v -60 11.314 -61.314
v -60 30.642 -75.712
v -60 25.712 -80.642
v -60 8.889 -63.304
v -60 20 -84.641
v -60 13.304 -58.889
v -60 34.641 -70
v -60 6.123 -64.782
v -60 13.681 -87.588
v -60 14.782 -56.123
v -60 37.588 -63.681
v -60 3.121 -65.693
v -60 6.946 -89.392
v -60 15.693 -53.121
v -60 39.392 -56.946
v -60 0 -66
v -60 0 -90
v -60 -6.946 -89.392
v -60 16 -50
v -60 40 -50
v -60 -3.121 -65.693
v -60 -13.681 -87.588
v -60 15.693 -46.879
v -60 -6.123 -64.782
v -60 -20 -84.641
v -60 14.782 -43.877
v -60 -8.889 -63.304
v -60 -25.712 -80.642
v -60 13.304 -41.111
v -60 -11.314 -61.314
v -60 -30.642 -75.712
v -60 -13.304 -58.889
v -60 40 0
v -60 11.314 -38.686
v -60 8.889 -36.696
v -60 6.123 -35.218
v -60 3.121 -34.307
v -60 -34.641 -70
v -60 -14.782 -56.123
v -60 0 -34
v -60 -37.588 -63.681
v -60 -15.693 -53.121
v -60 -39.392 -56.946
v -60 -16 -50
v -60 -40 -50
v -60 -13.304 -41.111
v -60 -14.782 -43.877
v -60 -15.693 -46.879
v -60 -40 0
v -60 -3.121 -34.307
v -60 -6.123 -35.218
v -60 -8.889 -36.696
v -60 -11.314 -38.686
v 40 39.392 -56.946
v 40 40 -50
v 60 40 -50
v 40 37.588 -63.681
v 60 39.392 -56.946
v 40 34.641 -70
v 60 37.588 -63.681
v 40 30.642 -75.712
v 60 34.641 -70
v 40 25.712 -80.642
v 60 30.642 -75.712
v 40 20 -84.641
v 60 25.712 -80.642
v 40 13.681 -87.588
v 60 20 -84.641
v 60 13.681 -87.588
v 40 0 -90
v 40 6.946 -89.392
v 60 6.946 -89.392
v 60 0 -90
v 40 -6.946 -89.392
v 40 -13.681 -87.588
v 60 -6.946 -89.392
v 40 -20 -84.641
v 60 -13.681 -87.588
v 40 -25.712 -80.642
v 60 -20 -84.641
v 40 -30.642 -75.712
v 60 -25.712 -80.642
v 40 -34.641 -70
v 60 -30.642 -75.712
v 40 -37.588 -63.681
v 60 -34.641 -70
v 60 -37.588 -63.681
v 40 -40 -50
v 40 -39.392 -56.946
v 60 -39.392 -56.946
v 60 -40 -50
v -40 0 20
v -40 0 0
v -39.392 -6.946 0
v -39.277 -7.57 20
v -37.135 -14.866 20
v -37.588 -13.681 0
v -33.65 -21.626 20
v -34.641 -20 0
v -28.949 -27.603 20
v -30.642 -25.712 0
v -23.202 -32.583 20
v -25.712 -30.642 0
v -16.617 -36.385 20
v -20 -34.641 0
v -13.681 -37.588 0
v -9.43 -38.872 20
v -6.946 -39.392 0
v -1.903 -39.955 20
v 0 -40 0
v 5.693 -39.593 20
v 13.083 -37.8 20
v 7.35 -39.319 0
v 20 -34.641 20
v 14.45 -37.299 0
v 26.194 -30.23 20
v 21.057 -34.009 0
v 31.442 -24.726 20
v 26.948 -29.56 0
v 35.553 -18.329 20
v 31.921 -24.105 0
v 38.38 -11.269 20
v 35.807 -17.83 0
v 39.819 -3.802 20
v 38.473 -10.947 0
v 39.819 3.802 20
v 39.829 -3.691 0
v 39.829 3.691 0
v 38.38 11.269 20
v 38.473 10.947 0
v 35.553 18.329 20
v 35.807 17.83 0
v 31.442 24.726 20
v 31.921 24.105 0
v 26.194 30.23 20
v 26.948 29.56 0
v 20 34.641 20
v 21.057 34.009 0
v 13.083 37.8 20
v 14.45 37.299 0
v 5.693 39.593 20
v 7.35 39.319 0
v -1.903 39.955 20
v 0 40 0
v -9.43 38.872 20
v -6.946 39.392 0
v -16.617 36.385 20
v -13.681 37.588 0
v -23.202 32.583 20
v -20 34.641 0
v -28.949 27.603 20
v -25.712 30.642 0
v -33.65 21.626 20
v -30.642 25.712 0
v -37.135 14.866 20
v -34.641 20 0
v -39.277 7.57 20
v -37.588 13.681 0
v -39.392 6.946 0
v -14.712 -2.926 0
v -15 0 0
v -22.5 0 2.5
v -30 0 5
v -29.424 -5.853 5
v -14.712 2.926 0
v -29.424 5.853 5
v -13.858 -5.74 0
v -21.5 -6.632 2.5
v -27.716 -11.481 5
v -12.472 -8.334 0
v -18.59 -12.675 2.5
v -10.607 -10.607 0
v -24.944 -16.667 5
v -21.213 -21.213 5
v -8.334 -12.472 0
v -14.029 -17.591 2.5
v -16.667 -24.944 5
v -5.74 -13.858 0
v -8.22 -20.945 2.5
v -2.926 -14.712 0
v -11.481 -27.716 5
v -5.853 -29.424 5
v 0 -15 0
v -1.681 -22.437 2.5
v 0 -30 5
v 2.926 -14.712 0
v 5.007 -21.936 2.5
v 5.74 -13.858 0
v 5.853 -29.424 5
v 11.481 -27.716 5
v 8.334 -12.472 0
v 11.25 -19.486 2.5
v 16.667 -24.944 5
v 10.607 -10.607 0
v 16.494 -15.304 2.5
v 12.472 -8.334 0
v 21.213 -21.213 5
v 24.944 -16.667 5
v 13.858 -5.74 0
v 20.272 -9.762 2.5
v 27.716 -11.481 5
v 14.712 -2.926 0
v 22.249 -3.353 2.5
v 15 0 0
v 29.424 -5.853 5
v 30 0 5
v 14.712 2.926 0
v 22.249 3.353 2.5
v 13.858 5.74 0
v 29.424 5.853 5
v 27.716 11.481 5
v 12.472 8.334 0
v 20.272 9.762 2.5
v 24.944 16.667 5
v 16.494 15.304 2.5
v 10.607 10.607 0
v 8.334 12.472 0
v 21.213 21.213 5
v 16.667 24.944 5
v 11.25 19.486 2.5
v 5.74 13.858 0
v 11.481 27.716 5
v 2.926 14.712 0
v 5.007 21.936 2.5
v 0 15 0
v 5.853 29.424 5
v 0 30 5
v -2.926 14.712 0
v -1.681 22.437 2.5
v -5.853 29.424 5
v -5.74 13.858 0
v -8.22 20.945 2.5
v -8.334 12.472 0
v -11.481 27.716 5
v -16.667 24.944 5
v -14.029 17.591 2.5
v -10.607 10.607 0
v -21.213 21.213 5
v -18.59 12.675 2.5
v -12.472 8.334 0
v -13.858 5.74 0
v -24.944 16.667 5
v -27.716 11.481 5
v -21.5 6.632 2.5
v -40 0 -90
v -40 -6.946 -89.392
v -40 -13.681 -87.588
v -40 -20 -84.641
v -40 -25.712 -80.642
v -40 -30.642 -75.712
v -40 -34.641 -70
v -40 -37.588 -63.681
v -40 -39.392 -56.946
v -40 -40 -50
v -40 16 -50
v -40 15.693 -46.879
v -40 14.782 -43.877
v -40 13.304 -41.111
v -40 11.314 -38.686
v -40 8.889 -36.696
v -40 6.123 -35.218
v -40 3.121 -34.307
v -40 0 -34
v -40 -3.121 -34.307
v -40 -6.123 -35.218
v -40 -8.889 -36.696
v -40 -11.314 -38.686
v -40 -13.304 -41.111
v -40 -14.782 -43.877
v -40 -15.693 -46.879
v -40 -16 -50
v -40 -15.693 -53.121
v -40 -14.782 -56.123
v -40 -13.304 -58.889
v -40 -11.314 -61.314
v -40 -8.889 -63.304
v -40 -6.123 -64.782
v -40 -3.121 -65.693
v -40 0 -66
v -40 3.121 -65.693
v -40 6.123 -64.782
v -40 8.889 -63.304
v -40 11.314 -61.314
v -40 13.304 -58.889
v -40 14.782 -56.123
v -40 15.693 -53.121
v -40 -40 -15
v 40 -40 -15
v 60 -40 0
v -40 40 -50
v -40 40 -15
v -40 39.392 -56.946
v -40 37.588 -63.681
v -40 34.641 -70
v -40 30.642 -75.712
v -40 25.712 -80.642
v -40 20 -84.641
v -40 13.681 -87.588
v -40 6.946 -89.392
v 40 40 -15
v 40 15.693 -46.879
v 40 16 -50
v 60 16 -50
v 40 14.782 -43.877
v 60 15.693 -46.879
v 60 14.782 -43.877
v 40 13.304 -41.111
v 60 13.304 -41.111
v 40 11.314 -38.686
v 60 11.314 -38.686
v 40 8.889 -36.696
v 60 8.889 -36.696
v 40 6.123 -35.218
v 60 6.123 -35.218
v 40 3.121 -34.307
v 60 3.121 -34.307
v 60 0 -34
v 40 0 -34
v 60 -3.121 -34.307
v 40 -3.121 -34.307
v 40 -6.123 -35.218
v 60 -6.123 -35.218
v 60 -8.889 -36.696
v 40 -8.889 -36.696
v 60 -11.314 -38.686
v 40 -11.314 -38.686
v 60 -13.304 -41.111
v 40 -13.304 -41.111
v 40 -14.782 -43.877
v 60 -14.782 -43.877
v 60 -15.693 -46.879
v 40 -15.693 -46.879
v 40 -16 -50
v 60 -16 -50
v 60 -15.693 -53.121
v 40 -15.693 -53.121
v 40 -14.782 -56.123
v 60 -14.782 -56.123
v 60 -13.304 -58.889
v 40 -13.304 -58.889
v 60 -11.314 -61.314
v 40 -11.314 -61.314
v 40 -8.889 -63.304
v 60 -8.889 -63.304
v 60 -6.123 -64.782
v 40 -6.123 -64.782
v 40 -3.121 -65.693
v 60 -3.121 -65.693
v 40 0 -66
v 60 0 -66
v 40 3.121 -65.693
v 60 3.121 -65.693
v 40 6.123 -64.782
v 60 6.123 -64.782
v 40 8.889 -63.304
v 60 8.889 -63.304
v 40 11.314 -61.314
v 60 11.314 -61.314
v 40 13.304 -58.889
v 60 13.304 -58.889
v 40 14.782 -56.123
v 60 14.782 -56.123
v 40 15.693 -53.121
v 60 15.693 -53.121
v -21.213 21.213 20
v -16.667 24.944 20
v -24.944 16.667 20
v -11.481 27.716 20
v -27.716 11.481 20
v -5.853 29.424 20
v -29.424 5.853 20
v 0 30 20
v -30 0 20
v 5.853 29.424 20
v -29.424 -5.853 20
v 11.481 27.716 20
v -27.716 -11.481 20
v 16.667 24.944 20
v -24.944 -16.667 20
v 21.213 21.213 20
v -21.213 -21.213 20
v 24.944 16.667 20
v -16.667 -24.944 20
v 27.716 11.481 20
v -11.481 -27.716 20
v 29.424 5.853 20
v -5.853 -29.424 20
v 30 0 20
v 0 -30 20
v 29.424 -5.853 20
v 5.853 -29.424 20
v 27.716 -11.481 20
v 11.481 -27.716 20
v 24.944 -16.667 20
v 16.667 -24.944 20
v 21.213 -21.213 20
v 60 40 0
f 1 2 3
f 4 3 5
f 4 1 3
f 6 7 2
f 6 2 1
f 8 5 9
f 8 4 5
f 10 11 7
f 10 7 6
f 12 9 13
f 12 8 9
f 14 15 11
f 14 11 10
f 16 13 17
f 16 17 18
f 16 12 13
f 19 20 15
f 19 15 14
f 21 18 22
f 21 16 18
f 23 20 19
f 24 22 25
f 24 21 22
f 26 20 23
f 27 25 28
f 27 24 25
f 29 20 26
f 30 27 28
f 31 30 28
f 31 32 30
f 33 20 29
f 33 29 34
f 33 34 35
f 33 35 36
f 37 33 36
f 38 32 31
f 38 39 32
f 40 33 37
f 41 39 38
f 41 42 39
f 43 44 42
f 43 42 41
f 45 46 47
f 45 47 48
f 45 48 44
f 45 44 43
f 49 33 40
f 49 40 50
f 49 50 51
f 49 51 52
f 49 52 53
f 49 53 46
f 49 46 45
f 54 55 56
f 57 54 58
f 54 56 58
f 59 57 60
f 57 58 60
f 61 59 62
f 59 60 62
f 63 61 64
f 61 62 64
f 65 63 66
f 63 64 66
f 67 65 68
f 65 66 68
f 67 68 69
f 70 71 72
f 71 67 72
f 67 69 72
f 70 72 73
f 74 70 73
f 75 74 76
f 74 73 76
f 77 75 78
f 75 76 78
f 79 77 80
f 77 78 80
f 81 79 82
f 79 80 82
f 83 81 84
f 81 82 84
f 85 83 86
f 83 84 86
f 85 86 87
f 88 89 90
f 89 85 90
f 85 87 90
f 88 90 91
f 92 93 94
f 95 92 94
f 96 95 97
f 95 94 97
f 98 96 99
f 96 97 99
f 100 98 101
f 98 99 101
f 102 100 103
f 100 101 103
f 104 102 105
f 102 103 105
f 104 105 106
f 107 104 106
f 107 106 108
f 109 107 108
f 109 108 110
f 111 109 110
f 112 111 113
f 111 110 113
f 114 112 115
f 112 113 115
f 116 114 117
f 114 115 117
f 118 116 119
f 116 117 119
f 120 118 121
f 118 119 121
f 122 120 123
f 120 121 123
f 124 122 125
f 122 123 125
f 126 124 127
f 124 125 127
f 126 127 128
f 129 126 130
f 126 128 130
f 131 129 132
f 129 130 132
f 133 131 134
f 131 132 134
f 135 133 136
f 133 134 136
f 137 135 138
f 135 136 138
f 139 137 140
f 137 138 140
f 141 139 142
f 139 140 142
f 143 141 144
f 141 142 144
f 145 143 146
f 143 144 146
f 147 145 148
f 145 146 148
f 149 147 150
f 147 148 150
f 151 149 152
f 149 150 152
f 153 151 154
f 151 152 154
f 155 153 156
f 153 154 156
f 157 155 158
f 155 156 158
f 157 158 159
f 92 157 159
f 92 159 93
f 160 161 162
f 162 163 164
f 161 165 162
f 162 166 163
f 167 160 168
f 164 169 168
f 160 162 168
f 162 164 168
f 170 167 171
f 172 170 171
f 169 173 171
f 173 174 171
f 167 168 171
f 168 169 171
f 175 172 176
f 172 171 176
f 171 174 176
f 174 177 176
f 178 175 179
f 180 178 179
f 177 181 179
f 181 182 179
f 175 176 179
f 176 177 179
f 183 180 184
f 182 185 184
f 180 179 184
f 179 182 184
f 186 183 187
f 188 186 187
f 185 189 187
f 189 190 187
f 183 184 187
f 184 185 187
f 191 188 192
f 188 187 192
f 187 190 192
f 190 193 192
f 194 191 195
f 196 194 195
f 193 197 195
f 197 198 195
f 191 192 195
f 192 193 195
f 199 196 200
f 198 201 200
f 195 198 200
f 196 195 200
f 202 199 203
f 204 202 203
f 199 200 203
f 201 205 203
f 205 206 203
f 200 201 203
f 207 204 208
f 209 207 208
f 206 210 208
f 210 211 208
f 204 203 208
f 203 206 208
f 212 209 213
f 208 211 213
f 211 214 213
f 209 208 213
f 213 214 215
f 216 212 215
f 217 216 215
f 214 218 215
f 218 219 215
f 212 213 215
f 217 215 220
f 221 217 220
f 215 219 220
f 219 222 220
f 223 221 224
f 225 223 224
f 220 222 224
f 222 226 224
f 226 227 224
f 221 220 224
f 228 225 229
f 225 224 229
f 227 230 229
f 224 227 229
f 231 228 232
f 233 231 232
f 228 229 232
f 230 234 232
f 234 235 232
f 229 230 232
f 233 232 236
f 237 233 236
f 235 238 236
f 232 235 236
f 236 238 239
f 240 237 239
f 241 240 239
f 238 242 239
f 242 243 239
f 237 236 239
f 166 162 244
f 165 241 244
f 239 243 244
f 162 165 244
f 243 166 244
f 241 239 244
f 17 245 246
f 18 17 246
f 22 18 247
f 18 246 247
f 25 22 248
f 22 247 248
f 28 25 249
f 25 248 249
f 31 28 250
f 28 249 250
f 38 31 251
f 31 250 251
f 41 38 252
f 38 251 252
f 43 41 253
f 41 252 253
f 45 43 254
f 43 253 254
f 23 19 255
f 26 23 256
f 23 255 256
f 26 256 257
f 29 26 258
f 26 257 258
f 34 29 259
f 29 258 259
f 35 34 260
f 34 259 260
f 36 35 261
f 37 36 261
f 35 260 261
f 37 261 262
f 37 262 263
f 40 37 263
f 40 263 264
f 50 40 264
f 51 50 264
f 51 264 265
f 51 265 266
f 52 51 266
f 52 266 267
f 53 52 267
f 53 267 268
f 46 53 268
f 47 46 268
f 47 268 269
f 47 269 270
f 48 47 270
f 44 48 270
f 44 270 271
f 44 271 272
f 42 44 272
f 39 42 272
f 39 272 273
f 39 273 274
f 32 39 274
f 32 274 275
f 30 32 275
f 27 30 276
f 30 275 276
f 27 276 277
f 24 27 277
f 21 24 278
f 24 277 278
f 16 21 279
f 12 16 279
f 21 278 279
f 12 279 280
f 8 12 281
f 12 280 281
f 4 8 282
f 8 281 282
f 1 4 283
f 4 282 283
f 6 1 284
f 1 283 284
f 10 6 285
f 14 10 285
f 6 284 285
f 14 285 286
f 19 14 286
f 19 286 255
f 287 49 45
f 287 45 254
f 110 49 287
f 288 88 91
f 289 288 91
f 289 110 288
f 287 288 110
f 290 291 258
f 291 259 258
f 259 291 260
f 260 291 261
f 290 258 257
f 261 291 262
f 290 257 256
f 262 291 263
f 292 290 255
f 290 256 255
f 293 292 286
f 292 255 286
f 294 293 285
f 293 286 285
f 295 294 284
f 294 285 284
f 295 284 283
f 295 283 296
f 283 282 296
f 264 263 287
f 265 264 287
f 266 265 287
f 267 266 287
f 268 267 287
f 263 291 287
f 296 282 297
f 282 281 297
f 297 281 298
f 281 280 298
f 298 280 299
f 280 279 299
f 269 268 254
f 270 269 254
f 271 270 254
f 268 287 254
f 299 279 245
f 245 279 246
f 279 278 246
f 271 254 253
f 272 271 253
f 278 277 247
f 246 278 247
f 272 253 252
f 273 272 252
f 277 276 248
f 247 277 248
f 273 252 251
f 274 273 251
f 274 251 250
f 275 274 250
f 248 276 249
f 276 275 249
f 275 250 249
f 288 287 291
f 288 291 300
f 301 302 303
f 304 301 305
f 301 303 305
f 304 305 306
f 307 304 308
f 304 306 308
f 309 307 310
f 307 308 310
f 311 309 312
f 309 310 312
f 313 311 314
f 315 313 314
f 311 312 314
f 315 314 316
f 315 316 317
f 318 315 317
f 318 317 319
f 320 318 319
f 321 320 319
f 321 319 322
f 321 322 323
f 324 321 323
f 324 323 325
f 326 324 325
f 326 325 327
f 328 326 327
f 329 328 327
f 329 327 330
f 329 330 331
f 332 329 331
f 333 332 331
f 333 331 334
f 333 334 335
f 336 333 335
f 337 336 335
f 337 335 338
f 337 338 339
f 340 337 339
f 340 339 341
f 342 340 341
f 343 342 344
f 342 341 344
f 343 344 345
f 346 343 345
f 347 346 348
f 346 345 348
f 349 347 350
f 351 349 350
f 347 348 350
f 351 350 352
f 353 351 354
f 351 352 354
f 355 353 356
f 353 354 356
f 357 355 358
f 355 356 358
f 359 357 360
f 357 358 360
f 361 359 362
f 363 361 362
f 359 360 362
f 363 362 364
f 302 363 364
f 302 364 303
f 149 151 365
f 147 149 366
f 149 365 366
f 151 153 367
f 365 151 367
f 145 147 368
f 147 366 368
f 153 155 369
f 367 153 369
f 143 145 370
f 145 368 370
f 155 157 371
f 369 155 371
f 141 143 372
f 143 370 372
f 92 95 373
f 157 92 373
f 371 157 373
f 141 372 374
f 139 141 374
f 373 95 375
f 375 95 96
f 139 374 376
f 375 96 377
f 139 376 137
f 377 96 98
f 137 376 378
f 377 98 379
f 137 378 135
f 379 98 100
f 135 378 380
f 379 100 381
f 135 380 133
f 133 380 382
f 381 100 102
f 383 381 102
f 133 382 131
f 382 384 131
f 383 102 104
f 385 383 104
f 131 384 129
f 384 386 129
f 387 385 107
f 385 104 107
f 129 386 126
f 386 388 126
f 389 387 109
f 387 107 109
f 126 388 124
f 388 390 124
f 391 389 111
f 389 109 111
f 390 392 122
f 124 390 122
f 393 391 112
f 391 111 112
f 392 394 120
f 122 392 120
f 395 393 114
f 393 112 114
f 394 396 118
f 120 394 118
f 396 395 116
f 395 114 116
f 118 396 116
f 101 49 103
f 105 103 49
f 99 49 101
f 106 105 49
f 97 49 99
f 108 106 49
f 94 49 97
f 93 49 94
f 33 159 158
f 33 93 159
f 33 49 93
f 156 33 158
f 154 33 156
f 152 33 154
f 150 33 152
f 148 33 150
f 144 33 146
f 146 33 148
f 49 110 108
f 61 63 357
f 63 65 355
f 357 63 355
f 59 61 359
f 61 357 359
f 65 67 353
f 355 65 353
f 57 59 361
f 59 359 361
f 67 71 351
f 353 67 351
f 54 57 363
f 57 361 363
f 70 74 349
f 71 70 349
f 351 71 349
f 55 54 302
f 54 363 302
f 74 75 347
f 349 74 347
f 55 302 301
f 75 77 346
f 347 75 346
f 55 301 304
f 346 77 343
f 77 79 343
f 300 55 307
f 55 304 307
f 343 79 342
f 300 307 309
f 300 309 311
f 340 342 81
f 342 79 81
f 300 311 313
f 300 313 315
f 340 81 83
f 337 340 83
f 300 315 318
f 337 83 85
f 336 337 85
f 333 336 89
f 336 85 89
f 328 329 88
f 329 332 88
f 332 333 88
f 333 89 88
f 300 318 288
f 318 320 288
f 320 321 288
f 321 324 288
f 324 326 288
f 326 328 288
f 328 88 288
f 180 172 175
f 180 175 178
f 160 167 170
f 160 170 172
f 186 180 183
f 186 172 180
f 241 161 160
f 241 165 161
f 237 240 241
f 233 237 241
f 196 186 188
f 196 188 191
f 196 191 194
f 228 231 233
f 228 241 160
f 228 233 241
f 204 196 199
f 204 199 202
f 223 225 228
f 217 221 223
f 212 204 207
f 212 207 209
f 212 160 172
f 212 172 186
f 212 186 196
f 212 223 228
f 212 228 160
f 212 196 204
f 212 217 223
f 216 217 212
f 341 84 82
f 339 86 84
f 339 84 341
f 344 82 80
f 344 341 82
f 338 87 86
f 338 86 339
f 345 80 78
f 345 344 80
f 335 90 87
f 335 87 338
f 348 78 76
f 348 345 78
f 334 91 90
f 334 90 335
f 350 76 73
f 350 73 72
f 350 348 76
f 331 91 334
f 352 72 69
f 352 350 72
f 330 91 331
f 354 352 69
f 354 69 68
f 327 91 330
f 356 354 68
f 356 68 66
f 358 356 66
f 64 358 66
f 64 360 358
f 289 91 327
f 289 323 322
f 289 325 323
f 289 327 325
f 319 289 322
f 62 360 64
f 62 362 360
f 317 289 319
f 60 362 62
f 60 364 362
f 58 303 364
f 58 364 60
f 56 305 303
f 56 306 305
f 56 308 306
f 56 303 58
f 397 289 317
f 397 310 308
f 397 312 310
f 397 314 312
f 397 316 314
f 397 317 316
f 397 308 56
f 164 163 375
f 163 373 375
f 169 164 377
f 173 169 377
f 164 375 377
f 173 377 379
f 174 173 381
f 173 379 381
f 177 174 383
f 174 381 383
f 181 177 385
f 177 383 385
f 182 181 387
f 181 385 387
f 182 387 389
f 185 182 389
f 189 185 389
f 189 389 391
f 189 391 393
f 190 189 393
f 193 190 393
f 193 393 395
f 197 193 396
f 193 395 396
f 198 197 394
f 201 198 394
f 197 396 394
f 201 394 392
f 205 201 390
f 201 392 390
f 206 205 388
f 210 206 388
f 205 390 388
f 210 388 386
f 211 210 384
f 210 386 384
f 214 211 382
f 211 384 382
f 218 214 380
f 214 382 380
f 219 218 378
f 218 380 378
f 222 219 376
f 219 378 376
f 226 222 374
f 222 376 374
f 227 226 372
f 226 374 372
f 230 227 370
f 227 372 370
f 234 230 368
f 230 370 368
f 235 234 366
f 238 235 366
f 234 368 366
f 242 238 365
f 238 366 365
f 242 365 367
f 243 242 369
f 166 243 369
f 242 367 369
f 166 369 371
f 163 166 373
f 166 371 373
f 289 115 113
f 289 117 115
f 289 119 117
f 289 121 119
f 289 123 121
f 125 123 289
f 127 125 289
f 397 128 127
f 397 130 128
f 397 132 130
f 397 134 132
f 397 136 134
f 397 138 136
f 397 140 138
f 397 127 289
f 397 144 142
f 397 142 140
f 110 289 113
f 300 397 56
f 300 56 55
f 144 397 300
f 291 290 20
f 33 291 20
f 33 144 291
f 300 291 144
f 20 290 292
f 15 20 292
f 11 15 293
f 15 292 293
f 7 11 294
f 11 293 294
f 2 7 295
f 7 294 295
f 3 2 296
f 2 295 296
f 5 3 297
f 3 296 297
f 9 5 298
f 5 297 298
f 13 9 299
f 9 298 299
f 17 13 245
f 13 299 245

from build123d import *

# Parameters (mm, degrees)
F0_R     = 30
F0_R_2   = 15
F1_DEPTH = 90
F2_R     = 16
F3_DEPTH = 120
F4_W     = 80
F4_H     = 35
F4_H_2   = 40
F5_DEPTH = 250


with BuildPart() as f1:
    # F0 (on Top) → F1 (new body)
    with BuildSketch(Plane.XY):
        with BuildLine():
            ThreePointArc((0, -40), (-40, 0), (0, 40))
            Line((0, 40), (-60, 40))
            Line((-60, 40), (-60, -40))
            Line((-60, -40), (0, -40))
        make_face()
        with BuildLine():
            ThreePointArc((0, -40), (28.284271, -28.284271), (40, 0))
            ThreePointArc((40, 0), (28.284271, 28.284271), (0, 40))
            ThreePointArc((0, 40), (-40, 0), (0, -40))
        make_face()
        Circle(F0_R, mode=Mode.SUBTRACT)
        Circle(F0_R)
        Circle(F0_R_2, mode=Mode.SUBTRACT)
        Circle(F0_R_2)
        with BuildLine():
            ThreePointArc((0, 40), (28.284271, 28.284271), (40, 0))
            ThreePointArc((40, 0), (28.284271, -28.284271), (0, -40))
            Line((0, -40), (60, -40))
            Line((60, -40), (60, 40))
            Line((60, 40), (0, 40))
        make_face()
    extrude(amount=-F1_DEPTH)

    # F2 (on face) → F3 (cut)
    with BuildSketch(Plane.YZ.offset(60)):
        with Locations((0, -50)):
            Circle(F2_R)
        with BuildLine():
            ThreePointArc((0, -90), (-28.284271, -78.284271), (-40, -50))
            Line((-40, -50), (-40, -90))
            Line((-40, -90), (0, -90))
        make_face()
        with BuildLine():
            Line((40, -90), (40, -50))
            ThreePointArc((40, -50), (28.284271, -78.284271), (0, -90))
            Line((0, -90), (40, -90))
        make_face()
    extrude(amount=-F3_DEPTH, mode=Mode.SUBTRACT)

    # F4 (on face) → F5 (cut)
    with BuildSketch(Plane.XZ.offset(40)):
        with Locations((0, -32.5)):
            Rectangle(F4_W, F4_H)
        with Locations((0, -70)):
            Rectangle(F4_W, F4_H_2)
    extrude(amount=-F5_DEPTH, mode=Mode.SUBTRACT)

    # F6 (on Front) → F7 (revolve)
    with BuildSketch(Plane.XZ):
        Polygon((-40, 0), (-15, 0), (-30, 5), (-30, 20), (-40, 20), align=None)
    revolve(axis=Axis((0, 0, 23.827048), (0, 0, 1)))


solid = f1.part
